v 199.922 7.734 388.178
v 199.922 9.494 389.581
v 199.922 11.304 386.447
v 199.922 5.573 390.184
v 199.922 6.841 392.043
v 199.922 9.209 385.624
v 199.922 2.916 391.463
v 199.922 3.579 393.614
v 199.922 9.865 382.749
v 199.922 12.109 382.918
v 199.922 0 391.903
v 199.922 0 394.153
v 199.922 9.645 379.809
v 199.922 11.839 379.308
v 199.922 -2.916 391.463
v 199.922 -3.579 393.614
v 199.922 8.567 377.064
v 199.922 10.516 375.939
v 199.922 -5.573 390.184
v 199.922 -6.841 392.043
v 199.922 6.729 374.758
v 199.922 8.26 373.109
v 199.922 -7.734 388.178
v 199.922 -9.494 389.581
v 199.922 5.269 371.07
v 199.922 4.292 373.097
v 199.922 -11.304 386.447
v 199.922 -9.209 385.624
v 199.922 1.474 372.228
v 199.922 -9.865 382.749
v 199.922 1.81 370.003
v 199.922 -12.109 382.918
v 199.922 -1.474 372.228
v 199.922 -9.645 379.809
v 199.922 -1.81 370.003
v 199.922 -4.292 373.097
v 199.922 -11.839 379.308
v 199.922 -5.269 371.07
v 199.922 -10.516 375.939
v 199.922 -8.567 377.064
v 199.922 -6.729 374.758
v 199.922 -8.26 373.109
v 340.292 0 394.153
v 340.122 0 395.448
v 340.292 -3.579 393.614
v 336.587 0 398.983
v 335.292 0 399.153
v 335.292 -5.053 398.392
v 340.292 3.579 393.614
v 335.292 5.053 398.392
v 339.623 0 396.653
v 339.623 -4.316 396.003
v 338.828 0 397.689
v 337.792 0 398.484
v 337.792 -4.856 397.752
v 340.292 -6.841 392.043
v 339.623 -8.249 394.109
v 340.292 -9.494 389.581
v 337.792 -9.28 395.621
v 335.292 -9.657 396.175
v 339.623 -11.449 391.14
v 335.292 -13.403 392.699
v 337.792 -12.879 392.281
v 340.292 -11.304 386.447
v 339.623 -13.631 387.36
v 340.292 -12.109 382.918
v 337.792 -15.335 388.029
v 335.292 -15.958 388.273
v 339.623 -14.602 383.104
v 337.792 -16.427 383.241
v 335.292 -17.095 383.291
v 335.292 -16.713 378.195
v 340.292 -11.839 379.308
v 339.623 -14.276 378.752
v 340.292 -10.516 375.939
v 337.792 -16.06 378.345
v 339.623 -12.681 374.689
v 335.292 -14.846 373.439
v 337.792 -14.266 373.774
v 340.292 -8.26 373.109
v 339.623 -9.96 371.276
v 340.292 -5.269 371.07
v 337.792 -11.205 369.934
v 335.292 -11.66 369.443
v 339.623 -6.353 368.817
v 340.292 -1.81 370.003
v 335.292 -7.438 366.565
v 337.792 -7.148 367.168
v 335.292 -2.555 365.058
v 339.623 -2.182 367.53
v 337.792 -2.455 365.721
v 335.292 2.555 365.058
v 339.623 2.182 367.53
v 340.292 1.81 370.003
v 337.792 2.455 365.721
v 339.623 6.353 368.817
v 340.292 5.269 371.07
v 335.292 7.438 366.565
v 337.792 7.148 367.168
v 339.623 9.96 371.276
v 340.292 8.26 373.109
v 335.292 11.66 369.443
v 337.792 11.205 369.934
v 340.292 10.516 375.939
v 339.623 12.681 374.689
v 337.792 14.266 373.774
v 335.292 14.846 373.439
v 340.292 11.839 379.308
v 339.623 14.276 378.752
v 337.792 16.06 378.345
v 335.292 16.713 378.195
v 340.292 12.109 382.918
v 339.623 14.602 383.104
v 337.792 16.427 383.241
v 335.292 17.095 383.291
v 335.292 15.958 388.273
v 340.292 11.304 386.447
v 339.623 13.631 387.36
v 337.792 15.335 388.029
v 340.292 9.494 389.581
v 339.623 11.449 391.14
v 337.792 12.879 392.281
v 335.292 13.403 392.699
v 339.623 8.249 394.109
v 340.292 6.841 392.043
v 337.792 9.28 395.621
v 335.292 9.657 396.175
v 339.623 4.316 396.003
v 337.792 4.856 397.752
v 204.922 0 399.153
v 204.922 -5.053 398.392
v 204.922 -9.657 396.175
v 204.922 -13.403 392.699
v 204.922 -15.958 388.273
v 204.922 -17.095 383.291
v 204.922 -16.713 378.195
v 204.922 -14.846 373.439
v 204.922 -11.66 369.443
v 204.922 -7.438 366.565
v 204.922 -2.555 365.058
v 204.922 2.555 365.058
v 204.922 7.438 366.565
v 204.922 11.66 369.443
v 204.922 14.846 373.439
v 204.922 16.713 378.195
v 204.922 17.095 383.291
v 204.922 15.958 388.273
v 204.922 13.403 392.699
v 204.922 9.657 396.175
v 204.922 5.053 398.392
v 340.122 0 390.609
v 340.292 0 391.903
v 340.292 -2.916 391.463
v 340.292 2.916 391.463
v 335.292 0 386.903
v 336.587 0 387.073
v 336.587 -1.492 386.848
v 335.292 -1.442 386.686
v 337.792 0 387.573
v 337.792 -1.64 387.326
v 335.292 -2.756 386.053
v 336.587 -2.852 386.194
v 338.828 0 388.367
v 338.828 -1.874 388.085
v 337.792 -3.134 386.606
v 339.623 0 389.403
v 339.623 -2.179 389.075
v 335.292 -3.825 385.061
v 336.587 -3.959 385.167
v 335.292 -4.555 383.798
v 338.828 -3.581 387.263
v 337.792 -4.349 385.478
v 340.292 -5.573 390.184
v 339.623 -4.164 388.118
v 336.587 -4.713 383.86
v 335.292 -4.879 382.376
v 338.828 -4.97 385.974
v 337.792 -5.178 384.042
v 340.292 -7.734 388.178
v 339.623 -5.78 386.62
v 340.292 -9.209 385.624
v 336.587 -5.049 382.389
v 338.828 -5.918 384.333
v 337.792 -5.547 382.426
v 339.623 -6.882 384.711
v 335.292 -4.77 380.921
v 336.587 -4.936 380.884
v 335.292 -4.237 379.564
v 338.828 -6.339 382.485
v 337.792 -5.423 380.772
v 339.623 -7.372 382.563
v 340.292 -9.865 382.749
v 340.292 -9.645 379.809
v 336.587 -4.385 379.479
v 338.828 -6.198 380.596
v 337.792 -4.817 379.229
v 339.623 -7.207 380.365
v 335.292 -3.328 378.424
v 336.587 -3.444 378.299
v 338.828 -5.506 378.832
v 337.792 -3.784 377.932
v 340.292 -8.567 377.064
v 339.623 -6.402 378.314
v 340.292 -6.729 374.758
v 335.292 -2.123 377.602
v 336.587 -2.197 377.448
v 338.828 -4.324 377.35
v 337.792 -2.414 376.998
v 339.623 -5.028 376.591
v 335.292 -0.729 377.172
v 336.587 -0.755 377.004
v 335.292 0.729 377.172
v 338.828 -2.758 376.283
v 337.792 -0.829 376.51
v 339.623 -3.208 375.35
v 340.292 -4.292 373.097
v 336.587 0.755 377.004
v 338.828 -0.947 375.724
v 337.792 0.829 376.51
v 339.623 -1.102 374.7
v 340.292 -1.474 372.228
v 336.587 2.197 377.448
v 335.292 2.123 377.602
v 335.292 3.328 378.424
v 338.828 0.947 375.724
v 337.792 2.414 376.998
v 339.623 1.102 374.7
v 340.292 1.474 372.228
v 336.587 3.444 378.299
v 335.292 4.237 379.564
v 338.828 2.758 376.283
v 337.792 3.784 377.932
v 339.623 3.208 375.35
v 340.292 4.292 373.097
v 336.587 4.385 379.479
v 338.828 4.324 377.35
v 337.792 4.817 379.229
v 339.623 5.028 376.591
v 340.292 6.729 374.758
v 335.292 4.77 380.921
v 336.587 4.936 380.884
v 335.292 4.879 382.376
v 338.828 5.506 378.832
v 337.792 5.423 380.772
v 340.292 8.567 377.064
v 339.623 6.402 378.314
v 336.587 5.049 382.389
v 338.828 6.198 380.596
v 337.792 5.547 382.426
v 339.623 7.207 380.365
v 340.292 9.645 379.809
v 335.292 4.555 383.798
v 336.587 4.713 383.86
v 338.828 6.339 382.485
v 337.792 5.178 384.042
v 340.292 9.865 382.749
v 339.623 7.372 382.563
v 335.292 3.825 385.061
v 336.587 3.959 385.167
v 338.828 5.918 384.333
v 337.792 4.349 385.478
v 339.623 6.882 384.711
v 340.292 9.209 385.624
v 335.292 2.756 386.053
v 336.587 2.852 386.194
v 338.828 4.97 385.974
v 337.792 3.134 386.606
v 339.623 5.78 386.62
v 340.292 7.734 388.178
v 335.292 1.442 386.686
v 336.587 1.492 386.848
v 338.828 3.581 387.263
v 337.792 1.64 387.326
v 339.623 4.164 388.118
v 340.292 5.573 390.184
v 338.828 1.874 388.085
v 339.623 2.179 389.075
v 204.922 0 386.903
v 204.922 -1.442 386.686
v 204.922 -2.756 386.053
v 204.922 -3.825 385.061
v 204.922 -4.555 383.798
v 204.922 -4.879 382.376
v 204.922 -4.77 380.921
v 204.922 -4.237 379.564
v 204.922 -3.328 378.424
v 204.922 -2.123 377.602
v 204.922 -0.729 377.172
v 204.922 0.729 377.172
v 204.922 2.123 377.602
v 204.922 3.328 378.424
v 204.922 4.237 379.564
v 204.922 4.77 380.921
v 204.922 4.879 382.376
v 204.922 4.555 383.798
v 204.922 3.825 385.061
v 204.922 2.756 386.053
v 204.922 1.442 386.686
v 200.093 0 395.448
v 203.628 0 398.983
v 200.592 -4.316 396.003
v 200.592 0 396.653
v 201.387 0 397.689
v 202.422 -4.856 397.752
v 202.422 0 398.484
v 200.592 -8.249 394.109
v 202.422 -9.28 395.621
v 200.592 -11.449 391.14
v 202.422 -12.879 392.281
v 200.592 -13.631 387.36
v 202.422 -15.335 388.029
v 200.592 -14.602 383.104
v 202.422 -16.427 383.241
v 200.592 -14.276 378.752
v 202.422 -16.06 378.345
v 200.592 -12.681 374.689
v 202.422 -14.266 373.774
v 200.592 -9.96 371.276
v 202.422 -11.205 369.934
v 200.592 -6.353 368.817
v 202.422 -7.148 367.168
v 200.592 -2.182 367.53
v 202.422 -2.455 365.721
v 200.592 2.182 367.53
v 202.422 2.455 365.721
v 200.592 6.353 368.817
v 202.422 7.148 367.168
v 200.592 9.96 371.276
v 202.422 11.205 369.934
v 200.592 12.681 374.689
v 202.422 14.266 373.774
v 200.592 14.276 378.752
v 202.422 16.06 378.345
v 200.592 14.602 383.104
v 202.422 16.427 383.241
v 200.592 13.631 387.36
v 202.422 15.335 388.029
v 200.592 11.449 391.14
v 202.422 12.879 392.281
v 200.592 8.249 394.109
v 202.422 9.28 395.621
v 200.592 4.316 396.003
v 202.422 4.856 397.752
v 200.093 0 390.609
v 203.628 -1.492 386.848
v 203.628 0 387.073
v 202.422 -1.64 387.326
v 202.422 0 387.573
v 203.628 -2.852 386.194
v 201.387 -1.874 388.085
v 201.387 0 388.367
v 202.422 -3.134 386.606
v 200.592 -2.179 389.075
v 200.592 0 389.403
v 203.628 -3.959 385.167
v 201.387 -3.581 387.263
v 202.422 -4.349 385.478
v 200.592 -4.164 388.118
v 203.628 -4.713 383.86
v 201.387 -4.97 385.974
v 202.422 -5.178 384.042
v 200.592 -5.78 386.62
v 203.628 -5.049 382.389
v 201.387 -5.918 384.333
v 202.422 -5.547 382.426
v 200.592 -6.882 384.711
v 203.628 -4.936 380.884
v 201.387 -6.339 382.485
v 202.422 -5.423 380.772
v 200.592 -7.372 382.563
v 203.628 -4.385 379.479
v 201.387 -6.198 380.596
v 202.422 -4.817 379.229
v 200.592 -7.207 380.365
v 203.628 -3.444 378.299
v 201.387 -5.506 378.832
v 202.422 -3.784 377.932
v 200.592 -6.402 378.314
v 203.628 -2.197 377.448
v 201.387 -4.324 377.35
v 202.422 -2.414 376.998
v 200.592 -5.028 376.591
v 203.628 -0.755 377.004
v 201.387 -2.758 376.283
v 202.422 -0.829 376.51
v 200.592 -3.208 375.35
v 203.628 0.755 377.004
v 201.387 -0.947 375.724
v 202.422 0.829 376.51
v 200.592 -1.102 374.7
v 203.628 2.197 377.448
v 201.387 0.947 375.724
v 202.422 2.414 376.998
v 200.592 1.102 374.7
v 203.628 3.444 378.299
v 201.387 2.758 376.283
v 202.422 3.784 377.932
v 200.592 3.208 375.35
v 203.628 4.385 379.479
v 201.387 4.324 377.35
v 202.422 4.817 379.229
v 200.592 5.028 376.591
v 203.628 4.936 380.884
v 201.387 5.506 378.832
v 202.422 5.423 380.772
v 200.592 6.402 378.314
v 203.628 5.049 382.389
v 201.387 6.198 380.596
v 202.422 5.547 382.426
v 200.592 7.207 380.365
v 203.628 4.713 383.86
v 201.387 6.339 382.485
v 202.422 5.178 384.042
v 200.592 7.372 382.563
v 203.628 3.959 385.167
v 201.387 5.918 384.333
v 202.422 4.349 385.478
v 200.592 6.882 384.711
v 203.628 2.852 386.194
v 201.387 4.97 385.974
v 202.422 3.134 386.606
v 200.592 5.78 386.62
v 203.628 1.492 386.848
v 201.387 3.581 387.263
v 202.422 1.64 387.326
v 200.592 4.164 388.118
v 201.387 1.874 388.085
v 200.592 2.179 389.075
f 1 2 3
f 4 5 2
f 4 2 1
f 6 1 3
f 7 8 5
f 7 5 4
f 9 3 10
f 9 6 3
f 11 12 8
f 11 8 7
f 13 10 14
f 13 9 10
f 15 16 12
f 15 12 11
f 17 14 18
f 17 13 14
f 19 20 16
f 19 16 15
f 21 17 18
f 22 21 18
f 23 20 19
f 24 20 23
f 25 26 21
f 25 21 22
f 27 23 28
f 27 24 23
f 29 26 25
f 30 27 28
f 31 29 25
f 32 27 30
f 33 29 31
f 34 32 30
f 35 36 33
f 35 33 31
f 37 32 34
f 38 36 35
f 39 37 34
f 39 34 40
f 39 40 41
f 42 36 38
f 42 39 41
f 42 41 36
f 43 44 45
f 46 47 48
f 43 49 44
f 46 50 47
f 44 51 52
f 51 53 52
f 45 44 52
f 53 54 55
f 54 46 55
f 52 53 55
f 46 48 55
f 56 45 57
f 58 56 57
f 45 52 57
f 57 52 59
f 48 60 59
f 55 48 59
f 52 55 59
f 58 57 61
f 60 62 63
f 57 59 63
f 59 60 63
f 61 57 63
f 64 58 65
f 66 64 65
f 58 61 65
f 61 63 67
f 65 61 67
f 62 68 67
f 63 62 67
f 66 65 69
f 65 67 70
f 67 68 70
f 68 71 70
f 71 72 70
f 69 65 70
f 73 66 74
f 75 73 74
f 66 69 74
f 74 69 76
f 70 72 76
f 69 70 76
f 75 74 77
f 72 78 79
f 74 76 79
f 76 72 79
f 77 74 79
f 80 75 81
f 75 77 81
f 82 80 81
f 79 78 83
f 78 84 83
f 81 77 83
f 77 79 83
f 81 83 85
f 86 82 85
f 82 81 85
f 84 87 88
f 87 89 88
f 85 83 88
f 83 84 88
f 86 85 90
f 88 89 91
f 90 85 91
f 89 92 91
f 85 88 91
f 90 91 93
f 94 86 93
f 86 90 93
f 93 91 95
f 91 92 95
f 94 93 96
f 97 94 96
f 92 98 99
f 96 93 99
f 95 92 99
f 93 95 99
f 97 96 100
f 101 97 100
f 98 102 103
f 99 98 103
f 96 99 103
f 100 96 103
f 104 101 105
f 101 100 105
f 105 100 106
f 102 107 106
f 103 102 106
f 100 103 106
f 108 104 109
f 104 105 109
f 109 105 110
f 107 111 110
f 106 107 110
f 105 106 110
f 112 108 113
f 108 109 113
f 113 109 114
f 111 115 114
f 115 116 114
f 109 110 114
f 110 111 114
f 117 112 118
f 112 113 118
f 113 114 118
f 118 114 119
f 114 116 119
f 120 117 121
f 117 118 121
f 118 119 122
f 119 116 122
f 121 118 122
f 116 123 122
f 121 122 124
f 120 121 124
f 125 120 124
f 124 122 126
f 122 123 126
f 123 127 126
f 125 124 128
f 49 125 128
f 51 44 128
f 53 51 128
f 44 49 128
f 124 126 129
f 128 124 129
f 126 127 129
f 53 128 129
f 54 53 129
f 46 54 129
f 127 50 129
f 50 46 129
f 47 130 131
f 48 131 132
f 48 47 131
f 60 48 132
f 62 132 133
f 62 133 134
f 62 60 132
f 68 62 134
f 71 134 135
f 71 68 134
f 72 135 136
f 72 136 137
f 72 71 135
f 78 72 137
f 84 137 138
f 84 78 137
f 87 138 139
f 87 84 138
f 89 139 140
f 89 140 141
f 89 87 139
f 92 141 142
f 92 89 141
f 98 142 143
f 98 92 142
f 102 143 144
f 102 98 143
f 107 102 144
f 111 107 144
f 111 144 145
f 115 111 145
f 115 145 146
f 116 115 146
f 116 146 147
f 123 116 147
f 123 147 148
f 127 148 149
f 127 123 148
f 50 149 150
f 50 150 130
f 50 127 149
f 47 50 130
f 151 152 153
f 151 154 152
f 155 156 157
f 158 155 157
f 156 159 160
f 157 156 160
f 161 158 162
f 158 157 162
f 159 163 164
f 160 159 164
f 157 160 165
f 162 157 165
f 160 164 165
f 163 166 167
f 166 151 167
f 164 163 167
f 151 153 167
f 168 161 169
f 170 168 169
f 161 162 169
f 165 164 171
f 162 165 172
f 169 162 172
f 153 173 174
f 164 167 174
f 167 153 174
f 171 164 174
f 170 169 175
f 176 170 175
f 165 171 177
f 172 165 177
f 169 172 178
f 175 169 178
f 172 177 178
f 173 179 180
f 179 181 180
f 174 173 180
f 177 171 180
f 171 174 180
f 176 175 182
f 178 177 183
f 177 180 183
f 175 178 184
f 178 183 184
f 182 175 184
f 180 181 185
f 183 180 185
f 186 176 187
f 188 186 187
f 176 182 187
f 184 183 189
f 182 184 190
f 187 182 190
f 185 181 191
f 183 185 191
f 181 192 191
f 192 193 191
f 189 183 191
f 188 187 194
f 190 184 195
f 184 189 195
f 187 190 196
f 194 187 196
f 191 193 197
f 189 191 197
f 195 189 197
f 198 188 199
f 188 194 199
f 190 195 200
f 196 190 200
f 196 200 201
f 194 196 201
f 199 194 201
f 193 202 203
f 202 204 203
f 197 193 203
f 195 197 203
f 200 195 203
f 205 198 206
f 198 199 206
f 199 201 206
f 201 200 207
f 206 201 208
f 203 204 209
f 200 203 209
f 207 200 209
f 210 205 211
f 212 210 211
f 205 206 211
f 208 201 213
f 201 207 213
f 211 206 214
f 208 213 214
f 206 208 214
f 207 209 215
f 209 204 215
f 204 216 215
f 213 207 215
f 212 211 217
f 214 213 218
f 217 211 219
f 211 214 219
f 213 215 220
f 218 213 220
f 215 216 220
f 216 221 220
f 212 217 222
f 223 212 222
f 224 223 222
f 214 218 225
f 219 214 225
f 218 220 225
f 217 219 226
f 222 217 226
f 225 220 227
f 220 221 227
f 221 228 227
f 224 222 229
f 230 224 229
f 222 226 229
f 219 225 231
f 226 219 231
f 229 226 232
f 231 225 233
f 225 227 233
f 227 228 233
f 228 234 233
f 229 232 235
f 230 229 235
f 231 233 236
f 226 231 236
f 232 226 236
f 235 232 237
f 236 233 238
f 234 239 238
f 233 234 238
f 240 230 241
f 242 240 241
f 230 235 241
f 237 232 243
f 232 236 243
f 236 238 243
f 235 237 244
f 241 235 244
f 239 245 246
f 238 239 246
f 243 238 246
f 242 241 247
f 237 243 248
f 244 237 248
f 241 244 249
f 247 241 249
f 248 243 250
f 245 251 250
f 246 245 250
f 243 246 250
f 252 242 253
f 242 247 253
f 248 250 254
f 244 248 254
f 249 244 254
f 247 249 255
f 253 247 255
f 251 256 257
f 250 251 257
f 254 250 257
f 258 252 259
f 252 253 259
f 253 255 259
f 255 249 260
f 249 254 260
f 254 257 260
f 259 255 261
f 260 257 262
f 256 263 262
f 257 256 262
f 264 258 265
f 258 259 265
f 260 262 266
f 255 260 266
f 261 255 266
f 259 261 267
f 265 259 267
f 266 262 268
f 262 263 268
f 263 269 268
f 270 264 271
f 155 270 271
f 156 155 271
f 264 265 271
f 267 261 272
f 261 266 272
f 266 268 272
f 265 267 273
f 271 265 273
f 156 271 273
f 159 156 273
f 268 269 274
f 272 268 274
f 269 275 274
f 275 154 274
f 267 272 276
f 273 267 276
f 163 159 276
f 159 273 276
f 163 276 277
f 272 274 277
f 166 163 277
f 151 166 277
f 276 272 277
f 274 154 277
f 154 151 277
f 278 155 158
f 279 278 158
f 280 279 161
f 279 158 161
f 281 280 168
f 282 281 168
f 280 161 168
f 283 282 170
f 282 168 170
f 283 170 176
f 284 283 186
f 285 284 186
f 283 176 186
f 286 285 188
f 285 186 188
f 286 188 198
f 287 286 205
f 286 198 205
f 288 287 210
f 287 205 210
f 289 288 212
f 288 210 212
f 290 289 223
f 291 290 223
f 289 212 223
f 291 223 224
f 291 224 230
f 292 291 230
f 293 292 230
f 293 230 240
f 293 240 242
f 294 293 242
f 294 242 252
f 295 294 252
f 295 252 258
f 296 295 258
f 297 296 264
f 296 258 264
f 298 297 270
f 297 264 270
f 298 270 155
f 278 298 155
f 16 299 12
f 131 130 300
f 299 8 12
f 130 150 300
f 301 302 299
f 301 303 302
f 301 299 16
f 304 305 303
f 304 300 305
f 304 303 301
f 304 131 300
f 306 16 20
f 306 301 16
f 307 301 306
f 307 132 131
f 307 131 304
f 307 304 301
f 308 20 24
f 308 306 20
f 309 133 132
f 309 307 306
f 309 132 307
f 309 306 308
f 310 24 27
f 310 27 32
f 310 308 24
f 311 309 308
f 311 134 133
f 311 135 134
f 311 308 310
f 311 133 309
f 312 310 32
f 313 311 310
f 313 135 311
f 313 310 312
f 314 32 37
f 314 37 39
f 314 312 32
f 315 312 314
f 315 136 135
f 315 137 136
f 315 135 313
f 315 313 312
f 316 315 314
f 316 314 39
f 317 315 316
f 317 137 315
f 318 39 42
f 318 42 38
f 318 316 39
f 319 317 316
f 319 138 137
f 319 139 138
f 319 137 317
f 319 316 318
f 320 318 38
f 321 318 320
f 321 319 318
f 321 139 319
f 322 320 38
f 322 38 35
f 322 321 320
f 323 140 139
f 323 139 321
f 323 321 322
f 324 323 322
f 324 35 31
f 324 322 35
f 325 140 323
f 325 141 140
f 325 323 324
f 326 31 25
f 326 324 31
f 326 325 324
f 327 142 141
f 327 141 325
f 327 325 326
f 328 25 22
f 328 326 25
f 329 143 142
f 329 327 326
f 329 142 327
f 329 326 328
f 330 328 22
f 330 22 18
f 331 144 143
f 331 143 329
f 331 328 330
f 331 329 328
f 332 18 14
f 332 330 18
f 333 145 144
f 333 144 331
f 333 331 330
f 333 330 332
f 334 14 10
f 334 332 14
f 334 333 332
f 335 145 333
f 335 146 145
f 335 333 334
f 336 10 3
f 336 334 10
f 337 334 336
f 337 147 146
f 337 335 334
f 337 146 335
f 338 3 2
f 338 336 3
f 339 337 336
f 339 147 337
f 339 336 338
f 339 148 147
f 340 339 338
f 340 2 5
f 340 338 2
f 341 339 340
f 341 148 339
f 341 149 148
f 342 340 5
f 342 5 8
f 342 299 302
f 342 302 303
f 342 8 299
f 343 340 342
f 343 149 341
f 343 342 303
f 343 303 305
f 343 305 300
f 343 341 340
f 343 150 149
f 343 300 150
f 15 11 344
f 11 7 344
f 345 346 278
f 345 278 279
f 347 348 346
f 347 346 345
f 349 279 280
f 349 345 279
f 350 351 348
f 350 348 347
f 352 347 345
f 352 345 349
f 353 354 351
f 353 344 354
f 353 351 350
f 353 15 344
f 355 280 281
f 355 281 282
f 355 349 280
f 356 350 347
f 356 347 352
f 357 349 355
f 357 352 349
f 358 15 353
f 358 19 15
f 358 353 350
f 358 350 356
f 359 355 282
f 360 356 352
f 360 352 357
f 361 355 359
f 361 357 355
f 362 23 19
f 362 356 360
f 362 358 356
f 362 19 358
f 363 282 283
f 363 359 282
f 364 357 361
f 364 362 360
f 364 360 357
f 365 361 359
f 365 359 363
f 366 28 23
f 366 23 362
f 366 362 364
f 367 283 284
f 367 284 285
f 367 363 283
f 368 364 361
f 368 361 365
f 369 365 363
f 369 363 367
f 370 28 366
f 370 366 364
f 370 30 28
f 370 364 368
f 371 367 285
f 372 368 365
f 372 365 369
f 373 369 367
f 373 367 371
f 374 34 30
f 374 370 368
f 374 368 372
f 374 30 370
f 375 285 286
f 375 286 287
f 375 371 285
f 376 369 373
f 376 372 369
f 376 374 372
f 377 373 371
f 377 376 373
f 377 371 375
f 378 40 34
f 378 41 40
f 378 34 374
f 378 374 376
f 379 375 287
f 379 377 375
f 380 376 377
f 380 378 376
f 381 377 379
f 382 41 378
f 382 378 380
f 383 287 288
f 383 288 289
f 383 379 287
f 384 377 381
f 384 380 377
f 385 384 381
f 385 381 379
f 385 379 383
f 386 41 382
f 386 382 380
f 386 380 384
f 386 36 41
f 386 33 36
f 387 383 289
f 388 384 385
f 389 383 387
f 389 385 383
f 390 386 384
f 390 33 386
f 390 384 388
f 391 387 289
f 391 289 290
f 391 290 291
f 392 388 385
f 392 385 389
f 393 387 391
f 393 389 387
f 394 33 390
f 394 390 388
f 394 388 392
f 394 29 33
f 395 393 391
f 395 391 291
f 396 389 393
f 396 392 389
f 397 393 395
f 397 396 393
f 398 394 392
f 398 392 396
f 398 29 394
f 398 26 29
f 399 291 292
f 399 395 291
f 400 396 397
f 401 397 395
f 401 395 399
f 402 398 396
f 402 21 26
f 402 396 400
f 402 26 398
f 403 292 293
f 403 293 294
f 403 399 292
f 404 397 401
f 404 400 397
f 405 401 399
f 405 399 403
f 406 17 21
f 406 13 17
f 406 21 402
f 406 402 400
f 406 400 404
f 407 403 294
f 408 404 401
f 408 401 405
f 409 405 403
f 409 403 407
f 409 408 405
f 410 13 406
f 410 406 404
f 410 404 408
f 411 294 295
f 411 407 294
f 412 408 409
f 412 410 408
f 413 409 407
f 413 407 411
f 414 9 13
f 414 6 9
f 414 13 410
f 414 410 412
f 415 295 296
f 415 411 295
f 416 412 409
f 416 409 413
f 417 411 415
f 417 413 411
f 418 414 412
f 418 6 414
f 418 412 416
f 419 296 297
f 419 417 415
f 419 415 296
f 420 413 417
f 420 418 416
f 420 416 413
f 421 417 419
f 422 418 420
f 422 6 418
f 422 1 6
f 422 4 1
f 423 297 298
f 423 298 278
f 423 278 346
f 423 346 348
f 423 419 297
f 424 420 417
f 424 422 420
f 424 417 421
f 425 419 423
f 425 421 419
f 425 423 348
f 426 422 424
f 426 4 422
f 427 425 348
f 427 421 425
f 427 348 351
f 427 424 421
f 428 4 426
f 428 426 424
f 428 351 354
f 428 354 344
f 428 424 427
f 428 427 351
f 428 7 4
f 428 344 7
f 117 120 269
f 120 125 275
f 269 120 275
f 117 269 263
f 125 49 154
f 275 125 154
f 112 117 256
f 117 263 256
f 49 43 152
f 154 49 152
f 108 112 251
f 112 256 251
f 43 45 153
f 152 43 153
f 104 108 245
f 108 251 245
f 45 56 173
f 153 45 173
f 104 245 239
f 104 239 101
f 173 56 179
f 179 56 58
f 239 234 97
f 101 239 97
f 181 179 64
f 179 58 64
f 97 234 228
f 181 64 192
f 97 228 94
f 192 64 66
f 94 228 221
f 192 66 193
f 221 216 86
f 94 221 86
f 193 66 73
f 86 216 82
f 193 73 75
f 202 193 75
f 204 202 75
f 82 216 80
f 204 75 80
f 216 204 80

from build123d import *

# Parameters (mm, degrees)
F1_W = 140.3701454401
F1_H = 12.250483036
F5_R = 5
F6_R = 5


# Not quite as in the source:
# - a feature of the source that left no trace in its solid (it failed there, or was rolled back) is left out


with BuildPart() as f4:
    # F1 (on Front) → F4 (revolve)
    with BuildSketch(Plane.XZ):
        with Locations((270.1073512435, 393.0281996727)):
            Rectangle(F1_W, F1_H)
    revolve(axis=Axis((279.5873135328, 0, 382.010191679), (1, 0, 0)))

    # F5
    f5_edges = [f4.edges().sort_by_distance(p)[0] for p in [
        (340.292424, 0, 377.117425),
        (340.292424, 0, 364.866942),
    ]]
    fillet(f5_edges, radius=F5_R)

    # F6
    f6_edges = [f4.edges().sort_by_distance(p)[0] for p in [
        (199.922279, 0, 364.866942),
        (199.922279, 0, 377.117425),
    ]]
    fillet(f6_edges, radius=F6_R)


solid = f4.part
